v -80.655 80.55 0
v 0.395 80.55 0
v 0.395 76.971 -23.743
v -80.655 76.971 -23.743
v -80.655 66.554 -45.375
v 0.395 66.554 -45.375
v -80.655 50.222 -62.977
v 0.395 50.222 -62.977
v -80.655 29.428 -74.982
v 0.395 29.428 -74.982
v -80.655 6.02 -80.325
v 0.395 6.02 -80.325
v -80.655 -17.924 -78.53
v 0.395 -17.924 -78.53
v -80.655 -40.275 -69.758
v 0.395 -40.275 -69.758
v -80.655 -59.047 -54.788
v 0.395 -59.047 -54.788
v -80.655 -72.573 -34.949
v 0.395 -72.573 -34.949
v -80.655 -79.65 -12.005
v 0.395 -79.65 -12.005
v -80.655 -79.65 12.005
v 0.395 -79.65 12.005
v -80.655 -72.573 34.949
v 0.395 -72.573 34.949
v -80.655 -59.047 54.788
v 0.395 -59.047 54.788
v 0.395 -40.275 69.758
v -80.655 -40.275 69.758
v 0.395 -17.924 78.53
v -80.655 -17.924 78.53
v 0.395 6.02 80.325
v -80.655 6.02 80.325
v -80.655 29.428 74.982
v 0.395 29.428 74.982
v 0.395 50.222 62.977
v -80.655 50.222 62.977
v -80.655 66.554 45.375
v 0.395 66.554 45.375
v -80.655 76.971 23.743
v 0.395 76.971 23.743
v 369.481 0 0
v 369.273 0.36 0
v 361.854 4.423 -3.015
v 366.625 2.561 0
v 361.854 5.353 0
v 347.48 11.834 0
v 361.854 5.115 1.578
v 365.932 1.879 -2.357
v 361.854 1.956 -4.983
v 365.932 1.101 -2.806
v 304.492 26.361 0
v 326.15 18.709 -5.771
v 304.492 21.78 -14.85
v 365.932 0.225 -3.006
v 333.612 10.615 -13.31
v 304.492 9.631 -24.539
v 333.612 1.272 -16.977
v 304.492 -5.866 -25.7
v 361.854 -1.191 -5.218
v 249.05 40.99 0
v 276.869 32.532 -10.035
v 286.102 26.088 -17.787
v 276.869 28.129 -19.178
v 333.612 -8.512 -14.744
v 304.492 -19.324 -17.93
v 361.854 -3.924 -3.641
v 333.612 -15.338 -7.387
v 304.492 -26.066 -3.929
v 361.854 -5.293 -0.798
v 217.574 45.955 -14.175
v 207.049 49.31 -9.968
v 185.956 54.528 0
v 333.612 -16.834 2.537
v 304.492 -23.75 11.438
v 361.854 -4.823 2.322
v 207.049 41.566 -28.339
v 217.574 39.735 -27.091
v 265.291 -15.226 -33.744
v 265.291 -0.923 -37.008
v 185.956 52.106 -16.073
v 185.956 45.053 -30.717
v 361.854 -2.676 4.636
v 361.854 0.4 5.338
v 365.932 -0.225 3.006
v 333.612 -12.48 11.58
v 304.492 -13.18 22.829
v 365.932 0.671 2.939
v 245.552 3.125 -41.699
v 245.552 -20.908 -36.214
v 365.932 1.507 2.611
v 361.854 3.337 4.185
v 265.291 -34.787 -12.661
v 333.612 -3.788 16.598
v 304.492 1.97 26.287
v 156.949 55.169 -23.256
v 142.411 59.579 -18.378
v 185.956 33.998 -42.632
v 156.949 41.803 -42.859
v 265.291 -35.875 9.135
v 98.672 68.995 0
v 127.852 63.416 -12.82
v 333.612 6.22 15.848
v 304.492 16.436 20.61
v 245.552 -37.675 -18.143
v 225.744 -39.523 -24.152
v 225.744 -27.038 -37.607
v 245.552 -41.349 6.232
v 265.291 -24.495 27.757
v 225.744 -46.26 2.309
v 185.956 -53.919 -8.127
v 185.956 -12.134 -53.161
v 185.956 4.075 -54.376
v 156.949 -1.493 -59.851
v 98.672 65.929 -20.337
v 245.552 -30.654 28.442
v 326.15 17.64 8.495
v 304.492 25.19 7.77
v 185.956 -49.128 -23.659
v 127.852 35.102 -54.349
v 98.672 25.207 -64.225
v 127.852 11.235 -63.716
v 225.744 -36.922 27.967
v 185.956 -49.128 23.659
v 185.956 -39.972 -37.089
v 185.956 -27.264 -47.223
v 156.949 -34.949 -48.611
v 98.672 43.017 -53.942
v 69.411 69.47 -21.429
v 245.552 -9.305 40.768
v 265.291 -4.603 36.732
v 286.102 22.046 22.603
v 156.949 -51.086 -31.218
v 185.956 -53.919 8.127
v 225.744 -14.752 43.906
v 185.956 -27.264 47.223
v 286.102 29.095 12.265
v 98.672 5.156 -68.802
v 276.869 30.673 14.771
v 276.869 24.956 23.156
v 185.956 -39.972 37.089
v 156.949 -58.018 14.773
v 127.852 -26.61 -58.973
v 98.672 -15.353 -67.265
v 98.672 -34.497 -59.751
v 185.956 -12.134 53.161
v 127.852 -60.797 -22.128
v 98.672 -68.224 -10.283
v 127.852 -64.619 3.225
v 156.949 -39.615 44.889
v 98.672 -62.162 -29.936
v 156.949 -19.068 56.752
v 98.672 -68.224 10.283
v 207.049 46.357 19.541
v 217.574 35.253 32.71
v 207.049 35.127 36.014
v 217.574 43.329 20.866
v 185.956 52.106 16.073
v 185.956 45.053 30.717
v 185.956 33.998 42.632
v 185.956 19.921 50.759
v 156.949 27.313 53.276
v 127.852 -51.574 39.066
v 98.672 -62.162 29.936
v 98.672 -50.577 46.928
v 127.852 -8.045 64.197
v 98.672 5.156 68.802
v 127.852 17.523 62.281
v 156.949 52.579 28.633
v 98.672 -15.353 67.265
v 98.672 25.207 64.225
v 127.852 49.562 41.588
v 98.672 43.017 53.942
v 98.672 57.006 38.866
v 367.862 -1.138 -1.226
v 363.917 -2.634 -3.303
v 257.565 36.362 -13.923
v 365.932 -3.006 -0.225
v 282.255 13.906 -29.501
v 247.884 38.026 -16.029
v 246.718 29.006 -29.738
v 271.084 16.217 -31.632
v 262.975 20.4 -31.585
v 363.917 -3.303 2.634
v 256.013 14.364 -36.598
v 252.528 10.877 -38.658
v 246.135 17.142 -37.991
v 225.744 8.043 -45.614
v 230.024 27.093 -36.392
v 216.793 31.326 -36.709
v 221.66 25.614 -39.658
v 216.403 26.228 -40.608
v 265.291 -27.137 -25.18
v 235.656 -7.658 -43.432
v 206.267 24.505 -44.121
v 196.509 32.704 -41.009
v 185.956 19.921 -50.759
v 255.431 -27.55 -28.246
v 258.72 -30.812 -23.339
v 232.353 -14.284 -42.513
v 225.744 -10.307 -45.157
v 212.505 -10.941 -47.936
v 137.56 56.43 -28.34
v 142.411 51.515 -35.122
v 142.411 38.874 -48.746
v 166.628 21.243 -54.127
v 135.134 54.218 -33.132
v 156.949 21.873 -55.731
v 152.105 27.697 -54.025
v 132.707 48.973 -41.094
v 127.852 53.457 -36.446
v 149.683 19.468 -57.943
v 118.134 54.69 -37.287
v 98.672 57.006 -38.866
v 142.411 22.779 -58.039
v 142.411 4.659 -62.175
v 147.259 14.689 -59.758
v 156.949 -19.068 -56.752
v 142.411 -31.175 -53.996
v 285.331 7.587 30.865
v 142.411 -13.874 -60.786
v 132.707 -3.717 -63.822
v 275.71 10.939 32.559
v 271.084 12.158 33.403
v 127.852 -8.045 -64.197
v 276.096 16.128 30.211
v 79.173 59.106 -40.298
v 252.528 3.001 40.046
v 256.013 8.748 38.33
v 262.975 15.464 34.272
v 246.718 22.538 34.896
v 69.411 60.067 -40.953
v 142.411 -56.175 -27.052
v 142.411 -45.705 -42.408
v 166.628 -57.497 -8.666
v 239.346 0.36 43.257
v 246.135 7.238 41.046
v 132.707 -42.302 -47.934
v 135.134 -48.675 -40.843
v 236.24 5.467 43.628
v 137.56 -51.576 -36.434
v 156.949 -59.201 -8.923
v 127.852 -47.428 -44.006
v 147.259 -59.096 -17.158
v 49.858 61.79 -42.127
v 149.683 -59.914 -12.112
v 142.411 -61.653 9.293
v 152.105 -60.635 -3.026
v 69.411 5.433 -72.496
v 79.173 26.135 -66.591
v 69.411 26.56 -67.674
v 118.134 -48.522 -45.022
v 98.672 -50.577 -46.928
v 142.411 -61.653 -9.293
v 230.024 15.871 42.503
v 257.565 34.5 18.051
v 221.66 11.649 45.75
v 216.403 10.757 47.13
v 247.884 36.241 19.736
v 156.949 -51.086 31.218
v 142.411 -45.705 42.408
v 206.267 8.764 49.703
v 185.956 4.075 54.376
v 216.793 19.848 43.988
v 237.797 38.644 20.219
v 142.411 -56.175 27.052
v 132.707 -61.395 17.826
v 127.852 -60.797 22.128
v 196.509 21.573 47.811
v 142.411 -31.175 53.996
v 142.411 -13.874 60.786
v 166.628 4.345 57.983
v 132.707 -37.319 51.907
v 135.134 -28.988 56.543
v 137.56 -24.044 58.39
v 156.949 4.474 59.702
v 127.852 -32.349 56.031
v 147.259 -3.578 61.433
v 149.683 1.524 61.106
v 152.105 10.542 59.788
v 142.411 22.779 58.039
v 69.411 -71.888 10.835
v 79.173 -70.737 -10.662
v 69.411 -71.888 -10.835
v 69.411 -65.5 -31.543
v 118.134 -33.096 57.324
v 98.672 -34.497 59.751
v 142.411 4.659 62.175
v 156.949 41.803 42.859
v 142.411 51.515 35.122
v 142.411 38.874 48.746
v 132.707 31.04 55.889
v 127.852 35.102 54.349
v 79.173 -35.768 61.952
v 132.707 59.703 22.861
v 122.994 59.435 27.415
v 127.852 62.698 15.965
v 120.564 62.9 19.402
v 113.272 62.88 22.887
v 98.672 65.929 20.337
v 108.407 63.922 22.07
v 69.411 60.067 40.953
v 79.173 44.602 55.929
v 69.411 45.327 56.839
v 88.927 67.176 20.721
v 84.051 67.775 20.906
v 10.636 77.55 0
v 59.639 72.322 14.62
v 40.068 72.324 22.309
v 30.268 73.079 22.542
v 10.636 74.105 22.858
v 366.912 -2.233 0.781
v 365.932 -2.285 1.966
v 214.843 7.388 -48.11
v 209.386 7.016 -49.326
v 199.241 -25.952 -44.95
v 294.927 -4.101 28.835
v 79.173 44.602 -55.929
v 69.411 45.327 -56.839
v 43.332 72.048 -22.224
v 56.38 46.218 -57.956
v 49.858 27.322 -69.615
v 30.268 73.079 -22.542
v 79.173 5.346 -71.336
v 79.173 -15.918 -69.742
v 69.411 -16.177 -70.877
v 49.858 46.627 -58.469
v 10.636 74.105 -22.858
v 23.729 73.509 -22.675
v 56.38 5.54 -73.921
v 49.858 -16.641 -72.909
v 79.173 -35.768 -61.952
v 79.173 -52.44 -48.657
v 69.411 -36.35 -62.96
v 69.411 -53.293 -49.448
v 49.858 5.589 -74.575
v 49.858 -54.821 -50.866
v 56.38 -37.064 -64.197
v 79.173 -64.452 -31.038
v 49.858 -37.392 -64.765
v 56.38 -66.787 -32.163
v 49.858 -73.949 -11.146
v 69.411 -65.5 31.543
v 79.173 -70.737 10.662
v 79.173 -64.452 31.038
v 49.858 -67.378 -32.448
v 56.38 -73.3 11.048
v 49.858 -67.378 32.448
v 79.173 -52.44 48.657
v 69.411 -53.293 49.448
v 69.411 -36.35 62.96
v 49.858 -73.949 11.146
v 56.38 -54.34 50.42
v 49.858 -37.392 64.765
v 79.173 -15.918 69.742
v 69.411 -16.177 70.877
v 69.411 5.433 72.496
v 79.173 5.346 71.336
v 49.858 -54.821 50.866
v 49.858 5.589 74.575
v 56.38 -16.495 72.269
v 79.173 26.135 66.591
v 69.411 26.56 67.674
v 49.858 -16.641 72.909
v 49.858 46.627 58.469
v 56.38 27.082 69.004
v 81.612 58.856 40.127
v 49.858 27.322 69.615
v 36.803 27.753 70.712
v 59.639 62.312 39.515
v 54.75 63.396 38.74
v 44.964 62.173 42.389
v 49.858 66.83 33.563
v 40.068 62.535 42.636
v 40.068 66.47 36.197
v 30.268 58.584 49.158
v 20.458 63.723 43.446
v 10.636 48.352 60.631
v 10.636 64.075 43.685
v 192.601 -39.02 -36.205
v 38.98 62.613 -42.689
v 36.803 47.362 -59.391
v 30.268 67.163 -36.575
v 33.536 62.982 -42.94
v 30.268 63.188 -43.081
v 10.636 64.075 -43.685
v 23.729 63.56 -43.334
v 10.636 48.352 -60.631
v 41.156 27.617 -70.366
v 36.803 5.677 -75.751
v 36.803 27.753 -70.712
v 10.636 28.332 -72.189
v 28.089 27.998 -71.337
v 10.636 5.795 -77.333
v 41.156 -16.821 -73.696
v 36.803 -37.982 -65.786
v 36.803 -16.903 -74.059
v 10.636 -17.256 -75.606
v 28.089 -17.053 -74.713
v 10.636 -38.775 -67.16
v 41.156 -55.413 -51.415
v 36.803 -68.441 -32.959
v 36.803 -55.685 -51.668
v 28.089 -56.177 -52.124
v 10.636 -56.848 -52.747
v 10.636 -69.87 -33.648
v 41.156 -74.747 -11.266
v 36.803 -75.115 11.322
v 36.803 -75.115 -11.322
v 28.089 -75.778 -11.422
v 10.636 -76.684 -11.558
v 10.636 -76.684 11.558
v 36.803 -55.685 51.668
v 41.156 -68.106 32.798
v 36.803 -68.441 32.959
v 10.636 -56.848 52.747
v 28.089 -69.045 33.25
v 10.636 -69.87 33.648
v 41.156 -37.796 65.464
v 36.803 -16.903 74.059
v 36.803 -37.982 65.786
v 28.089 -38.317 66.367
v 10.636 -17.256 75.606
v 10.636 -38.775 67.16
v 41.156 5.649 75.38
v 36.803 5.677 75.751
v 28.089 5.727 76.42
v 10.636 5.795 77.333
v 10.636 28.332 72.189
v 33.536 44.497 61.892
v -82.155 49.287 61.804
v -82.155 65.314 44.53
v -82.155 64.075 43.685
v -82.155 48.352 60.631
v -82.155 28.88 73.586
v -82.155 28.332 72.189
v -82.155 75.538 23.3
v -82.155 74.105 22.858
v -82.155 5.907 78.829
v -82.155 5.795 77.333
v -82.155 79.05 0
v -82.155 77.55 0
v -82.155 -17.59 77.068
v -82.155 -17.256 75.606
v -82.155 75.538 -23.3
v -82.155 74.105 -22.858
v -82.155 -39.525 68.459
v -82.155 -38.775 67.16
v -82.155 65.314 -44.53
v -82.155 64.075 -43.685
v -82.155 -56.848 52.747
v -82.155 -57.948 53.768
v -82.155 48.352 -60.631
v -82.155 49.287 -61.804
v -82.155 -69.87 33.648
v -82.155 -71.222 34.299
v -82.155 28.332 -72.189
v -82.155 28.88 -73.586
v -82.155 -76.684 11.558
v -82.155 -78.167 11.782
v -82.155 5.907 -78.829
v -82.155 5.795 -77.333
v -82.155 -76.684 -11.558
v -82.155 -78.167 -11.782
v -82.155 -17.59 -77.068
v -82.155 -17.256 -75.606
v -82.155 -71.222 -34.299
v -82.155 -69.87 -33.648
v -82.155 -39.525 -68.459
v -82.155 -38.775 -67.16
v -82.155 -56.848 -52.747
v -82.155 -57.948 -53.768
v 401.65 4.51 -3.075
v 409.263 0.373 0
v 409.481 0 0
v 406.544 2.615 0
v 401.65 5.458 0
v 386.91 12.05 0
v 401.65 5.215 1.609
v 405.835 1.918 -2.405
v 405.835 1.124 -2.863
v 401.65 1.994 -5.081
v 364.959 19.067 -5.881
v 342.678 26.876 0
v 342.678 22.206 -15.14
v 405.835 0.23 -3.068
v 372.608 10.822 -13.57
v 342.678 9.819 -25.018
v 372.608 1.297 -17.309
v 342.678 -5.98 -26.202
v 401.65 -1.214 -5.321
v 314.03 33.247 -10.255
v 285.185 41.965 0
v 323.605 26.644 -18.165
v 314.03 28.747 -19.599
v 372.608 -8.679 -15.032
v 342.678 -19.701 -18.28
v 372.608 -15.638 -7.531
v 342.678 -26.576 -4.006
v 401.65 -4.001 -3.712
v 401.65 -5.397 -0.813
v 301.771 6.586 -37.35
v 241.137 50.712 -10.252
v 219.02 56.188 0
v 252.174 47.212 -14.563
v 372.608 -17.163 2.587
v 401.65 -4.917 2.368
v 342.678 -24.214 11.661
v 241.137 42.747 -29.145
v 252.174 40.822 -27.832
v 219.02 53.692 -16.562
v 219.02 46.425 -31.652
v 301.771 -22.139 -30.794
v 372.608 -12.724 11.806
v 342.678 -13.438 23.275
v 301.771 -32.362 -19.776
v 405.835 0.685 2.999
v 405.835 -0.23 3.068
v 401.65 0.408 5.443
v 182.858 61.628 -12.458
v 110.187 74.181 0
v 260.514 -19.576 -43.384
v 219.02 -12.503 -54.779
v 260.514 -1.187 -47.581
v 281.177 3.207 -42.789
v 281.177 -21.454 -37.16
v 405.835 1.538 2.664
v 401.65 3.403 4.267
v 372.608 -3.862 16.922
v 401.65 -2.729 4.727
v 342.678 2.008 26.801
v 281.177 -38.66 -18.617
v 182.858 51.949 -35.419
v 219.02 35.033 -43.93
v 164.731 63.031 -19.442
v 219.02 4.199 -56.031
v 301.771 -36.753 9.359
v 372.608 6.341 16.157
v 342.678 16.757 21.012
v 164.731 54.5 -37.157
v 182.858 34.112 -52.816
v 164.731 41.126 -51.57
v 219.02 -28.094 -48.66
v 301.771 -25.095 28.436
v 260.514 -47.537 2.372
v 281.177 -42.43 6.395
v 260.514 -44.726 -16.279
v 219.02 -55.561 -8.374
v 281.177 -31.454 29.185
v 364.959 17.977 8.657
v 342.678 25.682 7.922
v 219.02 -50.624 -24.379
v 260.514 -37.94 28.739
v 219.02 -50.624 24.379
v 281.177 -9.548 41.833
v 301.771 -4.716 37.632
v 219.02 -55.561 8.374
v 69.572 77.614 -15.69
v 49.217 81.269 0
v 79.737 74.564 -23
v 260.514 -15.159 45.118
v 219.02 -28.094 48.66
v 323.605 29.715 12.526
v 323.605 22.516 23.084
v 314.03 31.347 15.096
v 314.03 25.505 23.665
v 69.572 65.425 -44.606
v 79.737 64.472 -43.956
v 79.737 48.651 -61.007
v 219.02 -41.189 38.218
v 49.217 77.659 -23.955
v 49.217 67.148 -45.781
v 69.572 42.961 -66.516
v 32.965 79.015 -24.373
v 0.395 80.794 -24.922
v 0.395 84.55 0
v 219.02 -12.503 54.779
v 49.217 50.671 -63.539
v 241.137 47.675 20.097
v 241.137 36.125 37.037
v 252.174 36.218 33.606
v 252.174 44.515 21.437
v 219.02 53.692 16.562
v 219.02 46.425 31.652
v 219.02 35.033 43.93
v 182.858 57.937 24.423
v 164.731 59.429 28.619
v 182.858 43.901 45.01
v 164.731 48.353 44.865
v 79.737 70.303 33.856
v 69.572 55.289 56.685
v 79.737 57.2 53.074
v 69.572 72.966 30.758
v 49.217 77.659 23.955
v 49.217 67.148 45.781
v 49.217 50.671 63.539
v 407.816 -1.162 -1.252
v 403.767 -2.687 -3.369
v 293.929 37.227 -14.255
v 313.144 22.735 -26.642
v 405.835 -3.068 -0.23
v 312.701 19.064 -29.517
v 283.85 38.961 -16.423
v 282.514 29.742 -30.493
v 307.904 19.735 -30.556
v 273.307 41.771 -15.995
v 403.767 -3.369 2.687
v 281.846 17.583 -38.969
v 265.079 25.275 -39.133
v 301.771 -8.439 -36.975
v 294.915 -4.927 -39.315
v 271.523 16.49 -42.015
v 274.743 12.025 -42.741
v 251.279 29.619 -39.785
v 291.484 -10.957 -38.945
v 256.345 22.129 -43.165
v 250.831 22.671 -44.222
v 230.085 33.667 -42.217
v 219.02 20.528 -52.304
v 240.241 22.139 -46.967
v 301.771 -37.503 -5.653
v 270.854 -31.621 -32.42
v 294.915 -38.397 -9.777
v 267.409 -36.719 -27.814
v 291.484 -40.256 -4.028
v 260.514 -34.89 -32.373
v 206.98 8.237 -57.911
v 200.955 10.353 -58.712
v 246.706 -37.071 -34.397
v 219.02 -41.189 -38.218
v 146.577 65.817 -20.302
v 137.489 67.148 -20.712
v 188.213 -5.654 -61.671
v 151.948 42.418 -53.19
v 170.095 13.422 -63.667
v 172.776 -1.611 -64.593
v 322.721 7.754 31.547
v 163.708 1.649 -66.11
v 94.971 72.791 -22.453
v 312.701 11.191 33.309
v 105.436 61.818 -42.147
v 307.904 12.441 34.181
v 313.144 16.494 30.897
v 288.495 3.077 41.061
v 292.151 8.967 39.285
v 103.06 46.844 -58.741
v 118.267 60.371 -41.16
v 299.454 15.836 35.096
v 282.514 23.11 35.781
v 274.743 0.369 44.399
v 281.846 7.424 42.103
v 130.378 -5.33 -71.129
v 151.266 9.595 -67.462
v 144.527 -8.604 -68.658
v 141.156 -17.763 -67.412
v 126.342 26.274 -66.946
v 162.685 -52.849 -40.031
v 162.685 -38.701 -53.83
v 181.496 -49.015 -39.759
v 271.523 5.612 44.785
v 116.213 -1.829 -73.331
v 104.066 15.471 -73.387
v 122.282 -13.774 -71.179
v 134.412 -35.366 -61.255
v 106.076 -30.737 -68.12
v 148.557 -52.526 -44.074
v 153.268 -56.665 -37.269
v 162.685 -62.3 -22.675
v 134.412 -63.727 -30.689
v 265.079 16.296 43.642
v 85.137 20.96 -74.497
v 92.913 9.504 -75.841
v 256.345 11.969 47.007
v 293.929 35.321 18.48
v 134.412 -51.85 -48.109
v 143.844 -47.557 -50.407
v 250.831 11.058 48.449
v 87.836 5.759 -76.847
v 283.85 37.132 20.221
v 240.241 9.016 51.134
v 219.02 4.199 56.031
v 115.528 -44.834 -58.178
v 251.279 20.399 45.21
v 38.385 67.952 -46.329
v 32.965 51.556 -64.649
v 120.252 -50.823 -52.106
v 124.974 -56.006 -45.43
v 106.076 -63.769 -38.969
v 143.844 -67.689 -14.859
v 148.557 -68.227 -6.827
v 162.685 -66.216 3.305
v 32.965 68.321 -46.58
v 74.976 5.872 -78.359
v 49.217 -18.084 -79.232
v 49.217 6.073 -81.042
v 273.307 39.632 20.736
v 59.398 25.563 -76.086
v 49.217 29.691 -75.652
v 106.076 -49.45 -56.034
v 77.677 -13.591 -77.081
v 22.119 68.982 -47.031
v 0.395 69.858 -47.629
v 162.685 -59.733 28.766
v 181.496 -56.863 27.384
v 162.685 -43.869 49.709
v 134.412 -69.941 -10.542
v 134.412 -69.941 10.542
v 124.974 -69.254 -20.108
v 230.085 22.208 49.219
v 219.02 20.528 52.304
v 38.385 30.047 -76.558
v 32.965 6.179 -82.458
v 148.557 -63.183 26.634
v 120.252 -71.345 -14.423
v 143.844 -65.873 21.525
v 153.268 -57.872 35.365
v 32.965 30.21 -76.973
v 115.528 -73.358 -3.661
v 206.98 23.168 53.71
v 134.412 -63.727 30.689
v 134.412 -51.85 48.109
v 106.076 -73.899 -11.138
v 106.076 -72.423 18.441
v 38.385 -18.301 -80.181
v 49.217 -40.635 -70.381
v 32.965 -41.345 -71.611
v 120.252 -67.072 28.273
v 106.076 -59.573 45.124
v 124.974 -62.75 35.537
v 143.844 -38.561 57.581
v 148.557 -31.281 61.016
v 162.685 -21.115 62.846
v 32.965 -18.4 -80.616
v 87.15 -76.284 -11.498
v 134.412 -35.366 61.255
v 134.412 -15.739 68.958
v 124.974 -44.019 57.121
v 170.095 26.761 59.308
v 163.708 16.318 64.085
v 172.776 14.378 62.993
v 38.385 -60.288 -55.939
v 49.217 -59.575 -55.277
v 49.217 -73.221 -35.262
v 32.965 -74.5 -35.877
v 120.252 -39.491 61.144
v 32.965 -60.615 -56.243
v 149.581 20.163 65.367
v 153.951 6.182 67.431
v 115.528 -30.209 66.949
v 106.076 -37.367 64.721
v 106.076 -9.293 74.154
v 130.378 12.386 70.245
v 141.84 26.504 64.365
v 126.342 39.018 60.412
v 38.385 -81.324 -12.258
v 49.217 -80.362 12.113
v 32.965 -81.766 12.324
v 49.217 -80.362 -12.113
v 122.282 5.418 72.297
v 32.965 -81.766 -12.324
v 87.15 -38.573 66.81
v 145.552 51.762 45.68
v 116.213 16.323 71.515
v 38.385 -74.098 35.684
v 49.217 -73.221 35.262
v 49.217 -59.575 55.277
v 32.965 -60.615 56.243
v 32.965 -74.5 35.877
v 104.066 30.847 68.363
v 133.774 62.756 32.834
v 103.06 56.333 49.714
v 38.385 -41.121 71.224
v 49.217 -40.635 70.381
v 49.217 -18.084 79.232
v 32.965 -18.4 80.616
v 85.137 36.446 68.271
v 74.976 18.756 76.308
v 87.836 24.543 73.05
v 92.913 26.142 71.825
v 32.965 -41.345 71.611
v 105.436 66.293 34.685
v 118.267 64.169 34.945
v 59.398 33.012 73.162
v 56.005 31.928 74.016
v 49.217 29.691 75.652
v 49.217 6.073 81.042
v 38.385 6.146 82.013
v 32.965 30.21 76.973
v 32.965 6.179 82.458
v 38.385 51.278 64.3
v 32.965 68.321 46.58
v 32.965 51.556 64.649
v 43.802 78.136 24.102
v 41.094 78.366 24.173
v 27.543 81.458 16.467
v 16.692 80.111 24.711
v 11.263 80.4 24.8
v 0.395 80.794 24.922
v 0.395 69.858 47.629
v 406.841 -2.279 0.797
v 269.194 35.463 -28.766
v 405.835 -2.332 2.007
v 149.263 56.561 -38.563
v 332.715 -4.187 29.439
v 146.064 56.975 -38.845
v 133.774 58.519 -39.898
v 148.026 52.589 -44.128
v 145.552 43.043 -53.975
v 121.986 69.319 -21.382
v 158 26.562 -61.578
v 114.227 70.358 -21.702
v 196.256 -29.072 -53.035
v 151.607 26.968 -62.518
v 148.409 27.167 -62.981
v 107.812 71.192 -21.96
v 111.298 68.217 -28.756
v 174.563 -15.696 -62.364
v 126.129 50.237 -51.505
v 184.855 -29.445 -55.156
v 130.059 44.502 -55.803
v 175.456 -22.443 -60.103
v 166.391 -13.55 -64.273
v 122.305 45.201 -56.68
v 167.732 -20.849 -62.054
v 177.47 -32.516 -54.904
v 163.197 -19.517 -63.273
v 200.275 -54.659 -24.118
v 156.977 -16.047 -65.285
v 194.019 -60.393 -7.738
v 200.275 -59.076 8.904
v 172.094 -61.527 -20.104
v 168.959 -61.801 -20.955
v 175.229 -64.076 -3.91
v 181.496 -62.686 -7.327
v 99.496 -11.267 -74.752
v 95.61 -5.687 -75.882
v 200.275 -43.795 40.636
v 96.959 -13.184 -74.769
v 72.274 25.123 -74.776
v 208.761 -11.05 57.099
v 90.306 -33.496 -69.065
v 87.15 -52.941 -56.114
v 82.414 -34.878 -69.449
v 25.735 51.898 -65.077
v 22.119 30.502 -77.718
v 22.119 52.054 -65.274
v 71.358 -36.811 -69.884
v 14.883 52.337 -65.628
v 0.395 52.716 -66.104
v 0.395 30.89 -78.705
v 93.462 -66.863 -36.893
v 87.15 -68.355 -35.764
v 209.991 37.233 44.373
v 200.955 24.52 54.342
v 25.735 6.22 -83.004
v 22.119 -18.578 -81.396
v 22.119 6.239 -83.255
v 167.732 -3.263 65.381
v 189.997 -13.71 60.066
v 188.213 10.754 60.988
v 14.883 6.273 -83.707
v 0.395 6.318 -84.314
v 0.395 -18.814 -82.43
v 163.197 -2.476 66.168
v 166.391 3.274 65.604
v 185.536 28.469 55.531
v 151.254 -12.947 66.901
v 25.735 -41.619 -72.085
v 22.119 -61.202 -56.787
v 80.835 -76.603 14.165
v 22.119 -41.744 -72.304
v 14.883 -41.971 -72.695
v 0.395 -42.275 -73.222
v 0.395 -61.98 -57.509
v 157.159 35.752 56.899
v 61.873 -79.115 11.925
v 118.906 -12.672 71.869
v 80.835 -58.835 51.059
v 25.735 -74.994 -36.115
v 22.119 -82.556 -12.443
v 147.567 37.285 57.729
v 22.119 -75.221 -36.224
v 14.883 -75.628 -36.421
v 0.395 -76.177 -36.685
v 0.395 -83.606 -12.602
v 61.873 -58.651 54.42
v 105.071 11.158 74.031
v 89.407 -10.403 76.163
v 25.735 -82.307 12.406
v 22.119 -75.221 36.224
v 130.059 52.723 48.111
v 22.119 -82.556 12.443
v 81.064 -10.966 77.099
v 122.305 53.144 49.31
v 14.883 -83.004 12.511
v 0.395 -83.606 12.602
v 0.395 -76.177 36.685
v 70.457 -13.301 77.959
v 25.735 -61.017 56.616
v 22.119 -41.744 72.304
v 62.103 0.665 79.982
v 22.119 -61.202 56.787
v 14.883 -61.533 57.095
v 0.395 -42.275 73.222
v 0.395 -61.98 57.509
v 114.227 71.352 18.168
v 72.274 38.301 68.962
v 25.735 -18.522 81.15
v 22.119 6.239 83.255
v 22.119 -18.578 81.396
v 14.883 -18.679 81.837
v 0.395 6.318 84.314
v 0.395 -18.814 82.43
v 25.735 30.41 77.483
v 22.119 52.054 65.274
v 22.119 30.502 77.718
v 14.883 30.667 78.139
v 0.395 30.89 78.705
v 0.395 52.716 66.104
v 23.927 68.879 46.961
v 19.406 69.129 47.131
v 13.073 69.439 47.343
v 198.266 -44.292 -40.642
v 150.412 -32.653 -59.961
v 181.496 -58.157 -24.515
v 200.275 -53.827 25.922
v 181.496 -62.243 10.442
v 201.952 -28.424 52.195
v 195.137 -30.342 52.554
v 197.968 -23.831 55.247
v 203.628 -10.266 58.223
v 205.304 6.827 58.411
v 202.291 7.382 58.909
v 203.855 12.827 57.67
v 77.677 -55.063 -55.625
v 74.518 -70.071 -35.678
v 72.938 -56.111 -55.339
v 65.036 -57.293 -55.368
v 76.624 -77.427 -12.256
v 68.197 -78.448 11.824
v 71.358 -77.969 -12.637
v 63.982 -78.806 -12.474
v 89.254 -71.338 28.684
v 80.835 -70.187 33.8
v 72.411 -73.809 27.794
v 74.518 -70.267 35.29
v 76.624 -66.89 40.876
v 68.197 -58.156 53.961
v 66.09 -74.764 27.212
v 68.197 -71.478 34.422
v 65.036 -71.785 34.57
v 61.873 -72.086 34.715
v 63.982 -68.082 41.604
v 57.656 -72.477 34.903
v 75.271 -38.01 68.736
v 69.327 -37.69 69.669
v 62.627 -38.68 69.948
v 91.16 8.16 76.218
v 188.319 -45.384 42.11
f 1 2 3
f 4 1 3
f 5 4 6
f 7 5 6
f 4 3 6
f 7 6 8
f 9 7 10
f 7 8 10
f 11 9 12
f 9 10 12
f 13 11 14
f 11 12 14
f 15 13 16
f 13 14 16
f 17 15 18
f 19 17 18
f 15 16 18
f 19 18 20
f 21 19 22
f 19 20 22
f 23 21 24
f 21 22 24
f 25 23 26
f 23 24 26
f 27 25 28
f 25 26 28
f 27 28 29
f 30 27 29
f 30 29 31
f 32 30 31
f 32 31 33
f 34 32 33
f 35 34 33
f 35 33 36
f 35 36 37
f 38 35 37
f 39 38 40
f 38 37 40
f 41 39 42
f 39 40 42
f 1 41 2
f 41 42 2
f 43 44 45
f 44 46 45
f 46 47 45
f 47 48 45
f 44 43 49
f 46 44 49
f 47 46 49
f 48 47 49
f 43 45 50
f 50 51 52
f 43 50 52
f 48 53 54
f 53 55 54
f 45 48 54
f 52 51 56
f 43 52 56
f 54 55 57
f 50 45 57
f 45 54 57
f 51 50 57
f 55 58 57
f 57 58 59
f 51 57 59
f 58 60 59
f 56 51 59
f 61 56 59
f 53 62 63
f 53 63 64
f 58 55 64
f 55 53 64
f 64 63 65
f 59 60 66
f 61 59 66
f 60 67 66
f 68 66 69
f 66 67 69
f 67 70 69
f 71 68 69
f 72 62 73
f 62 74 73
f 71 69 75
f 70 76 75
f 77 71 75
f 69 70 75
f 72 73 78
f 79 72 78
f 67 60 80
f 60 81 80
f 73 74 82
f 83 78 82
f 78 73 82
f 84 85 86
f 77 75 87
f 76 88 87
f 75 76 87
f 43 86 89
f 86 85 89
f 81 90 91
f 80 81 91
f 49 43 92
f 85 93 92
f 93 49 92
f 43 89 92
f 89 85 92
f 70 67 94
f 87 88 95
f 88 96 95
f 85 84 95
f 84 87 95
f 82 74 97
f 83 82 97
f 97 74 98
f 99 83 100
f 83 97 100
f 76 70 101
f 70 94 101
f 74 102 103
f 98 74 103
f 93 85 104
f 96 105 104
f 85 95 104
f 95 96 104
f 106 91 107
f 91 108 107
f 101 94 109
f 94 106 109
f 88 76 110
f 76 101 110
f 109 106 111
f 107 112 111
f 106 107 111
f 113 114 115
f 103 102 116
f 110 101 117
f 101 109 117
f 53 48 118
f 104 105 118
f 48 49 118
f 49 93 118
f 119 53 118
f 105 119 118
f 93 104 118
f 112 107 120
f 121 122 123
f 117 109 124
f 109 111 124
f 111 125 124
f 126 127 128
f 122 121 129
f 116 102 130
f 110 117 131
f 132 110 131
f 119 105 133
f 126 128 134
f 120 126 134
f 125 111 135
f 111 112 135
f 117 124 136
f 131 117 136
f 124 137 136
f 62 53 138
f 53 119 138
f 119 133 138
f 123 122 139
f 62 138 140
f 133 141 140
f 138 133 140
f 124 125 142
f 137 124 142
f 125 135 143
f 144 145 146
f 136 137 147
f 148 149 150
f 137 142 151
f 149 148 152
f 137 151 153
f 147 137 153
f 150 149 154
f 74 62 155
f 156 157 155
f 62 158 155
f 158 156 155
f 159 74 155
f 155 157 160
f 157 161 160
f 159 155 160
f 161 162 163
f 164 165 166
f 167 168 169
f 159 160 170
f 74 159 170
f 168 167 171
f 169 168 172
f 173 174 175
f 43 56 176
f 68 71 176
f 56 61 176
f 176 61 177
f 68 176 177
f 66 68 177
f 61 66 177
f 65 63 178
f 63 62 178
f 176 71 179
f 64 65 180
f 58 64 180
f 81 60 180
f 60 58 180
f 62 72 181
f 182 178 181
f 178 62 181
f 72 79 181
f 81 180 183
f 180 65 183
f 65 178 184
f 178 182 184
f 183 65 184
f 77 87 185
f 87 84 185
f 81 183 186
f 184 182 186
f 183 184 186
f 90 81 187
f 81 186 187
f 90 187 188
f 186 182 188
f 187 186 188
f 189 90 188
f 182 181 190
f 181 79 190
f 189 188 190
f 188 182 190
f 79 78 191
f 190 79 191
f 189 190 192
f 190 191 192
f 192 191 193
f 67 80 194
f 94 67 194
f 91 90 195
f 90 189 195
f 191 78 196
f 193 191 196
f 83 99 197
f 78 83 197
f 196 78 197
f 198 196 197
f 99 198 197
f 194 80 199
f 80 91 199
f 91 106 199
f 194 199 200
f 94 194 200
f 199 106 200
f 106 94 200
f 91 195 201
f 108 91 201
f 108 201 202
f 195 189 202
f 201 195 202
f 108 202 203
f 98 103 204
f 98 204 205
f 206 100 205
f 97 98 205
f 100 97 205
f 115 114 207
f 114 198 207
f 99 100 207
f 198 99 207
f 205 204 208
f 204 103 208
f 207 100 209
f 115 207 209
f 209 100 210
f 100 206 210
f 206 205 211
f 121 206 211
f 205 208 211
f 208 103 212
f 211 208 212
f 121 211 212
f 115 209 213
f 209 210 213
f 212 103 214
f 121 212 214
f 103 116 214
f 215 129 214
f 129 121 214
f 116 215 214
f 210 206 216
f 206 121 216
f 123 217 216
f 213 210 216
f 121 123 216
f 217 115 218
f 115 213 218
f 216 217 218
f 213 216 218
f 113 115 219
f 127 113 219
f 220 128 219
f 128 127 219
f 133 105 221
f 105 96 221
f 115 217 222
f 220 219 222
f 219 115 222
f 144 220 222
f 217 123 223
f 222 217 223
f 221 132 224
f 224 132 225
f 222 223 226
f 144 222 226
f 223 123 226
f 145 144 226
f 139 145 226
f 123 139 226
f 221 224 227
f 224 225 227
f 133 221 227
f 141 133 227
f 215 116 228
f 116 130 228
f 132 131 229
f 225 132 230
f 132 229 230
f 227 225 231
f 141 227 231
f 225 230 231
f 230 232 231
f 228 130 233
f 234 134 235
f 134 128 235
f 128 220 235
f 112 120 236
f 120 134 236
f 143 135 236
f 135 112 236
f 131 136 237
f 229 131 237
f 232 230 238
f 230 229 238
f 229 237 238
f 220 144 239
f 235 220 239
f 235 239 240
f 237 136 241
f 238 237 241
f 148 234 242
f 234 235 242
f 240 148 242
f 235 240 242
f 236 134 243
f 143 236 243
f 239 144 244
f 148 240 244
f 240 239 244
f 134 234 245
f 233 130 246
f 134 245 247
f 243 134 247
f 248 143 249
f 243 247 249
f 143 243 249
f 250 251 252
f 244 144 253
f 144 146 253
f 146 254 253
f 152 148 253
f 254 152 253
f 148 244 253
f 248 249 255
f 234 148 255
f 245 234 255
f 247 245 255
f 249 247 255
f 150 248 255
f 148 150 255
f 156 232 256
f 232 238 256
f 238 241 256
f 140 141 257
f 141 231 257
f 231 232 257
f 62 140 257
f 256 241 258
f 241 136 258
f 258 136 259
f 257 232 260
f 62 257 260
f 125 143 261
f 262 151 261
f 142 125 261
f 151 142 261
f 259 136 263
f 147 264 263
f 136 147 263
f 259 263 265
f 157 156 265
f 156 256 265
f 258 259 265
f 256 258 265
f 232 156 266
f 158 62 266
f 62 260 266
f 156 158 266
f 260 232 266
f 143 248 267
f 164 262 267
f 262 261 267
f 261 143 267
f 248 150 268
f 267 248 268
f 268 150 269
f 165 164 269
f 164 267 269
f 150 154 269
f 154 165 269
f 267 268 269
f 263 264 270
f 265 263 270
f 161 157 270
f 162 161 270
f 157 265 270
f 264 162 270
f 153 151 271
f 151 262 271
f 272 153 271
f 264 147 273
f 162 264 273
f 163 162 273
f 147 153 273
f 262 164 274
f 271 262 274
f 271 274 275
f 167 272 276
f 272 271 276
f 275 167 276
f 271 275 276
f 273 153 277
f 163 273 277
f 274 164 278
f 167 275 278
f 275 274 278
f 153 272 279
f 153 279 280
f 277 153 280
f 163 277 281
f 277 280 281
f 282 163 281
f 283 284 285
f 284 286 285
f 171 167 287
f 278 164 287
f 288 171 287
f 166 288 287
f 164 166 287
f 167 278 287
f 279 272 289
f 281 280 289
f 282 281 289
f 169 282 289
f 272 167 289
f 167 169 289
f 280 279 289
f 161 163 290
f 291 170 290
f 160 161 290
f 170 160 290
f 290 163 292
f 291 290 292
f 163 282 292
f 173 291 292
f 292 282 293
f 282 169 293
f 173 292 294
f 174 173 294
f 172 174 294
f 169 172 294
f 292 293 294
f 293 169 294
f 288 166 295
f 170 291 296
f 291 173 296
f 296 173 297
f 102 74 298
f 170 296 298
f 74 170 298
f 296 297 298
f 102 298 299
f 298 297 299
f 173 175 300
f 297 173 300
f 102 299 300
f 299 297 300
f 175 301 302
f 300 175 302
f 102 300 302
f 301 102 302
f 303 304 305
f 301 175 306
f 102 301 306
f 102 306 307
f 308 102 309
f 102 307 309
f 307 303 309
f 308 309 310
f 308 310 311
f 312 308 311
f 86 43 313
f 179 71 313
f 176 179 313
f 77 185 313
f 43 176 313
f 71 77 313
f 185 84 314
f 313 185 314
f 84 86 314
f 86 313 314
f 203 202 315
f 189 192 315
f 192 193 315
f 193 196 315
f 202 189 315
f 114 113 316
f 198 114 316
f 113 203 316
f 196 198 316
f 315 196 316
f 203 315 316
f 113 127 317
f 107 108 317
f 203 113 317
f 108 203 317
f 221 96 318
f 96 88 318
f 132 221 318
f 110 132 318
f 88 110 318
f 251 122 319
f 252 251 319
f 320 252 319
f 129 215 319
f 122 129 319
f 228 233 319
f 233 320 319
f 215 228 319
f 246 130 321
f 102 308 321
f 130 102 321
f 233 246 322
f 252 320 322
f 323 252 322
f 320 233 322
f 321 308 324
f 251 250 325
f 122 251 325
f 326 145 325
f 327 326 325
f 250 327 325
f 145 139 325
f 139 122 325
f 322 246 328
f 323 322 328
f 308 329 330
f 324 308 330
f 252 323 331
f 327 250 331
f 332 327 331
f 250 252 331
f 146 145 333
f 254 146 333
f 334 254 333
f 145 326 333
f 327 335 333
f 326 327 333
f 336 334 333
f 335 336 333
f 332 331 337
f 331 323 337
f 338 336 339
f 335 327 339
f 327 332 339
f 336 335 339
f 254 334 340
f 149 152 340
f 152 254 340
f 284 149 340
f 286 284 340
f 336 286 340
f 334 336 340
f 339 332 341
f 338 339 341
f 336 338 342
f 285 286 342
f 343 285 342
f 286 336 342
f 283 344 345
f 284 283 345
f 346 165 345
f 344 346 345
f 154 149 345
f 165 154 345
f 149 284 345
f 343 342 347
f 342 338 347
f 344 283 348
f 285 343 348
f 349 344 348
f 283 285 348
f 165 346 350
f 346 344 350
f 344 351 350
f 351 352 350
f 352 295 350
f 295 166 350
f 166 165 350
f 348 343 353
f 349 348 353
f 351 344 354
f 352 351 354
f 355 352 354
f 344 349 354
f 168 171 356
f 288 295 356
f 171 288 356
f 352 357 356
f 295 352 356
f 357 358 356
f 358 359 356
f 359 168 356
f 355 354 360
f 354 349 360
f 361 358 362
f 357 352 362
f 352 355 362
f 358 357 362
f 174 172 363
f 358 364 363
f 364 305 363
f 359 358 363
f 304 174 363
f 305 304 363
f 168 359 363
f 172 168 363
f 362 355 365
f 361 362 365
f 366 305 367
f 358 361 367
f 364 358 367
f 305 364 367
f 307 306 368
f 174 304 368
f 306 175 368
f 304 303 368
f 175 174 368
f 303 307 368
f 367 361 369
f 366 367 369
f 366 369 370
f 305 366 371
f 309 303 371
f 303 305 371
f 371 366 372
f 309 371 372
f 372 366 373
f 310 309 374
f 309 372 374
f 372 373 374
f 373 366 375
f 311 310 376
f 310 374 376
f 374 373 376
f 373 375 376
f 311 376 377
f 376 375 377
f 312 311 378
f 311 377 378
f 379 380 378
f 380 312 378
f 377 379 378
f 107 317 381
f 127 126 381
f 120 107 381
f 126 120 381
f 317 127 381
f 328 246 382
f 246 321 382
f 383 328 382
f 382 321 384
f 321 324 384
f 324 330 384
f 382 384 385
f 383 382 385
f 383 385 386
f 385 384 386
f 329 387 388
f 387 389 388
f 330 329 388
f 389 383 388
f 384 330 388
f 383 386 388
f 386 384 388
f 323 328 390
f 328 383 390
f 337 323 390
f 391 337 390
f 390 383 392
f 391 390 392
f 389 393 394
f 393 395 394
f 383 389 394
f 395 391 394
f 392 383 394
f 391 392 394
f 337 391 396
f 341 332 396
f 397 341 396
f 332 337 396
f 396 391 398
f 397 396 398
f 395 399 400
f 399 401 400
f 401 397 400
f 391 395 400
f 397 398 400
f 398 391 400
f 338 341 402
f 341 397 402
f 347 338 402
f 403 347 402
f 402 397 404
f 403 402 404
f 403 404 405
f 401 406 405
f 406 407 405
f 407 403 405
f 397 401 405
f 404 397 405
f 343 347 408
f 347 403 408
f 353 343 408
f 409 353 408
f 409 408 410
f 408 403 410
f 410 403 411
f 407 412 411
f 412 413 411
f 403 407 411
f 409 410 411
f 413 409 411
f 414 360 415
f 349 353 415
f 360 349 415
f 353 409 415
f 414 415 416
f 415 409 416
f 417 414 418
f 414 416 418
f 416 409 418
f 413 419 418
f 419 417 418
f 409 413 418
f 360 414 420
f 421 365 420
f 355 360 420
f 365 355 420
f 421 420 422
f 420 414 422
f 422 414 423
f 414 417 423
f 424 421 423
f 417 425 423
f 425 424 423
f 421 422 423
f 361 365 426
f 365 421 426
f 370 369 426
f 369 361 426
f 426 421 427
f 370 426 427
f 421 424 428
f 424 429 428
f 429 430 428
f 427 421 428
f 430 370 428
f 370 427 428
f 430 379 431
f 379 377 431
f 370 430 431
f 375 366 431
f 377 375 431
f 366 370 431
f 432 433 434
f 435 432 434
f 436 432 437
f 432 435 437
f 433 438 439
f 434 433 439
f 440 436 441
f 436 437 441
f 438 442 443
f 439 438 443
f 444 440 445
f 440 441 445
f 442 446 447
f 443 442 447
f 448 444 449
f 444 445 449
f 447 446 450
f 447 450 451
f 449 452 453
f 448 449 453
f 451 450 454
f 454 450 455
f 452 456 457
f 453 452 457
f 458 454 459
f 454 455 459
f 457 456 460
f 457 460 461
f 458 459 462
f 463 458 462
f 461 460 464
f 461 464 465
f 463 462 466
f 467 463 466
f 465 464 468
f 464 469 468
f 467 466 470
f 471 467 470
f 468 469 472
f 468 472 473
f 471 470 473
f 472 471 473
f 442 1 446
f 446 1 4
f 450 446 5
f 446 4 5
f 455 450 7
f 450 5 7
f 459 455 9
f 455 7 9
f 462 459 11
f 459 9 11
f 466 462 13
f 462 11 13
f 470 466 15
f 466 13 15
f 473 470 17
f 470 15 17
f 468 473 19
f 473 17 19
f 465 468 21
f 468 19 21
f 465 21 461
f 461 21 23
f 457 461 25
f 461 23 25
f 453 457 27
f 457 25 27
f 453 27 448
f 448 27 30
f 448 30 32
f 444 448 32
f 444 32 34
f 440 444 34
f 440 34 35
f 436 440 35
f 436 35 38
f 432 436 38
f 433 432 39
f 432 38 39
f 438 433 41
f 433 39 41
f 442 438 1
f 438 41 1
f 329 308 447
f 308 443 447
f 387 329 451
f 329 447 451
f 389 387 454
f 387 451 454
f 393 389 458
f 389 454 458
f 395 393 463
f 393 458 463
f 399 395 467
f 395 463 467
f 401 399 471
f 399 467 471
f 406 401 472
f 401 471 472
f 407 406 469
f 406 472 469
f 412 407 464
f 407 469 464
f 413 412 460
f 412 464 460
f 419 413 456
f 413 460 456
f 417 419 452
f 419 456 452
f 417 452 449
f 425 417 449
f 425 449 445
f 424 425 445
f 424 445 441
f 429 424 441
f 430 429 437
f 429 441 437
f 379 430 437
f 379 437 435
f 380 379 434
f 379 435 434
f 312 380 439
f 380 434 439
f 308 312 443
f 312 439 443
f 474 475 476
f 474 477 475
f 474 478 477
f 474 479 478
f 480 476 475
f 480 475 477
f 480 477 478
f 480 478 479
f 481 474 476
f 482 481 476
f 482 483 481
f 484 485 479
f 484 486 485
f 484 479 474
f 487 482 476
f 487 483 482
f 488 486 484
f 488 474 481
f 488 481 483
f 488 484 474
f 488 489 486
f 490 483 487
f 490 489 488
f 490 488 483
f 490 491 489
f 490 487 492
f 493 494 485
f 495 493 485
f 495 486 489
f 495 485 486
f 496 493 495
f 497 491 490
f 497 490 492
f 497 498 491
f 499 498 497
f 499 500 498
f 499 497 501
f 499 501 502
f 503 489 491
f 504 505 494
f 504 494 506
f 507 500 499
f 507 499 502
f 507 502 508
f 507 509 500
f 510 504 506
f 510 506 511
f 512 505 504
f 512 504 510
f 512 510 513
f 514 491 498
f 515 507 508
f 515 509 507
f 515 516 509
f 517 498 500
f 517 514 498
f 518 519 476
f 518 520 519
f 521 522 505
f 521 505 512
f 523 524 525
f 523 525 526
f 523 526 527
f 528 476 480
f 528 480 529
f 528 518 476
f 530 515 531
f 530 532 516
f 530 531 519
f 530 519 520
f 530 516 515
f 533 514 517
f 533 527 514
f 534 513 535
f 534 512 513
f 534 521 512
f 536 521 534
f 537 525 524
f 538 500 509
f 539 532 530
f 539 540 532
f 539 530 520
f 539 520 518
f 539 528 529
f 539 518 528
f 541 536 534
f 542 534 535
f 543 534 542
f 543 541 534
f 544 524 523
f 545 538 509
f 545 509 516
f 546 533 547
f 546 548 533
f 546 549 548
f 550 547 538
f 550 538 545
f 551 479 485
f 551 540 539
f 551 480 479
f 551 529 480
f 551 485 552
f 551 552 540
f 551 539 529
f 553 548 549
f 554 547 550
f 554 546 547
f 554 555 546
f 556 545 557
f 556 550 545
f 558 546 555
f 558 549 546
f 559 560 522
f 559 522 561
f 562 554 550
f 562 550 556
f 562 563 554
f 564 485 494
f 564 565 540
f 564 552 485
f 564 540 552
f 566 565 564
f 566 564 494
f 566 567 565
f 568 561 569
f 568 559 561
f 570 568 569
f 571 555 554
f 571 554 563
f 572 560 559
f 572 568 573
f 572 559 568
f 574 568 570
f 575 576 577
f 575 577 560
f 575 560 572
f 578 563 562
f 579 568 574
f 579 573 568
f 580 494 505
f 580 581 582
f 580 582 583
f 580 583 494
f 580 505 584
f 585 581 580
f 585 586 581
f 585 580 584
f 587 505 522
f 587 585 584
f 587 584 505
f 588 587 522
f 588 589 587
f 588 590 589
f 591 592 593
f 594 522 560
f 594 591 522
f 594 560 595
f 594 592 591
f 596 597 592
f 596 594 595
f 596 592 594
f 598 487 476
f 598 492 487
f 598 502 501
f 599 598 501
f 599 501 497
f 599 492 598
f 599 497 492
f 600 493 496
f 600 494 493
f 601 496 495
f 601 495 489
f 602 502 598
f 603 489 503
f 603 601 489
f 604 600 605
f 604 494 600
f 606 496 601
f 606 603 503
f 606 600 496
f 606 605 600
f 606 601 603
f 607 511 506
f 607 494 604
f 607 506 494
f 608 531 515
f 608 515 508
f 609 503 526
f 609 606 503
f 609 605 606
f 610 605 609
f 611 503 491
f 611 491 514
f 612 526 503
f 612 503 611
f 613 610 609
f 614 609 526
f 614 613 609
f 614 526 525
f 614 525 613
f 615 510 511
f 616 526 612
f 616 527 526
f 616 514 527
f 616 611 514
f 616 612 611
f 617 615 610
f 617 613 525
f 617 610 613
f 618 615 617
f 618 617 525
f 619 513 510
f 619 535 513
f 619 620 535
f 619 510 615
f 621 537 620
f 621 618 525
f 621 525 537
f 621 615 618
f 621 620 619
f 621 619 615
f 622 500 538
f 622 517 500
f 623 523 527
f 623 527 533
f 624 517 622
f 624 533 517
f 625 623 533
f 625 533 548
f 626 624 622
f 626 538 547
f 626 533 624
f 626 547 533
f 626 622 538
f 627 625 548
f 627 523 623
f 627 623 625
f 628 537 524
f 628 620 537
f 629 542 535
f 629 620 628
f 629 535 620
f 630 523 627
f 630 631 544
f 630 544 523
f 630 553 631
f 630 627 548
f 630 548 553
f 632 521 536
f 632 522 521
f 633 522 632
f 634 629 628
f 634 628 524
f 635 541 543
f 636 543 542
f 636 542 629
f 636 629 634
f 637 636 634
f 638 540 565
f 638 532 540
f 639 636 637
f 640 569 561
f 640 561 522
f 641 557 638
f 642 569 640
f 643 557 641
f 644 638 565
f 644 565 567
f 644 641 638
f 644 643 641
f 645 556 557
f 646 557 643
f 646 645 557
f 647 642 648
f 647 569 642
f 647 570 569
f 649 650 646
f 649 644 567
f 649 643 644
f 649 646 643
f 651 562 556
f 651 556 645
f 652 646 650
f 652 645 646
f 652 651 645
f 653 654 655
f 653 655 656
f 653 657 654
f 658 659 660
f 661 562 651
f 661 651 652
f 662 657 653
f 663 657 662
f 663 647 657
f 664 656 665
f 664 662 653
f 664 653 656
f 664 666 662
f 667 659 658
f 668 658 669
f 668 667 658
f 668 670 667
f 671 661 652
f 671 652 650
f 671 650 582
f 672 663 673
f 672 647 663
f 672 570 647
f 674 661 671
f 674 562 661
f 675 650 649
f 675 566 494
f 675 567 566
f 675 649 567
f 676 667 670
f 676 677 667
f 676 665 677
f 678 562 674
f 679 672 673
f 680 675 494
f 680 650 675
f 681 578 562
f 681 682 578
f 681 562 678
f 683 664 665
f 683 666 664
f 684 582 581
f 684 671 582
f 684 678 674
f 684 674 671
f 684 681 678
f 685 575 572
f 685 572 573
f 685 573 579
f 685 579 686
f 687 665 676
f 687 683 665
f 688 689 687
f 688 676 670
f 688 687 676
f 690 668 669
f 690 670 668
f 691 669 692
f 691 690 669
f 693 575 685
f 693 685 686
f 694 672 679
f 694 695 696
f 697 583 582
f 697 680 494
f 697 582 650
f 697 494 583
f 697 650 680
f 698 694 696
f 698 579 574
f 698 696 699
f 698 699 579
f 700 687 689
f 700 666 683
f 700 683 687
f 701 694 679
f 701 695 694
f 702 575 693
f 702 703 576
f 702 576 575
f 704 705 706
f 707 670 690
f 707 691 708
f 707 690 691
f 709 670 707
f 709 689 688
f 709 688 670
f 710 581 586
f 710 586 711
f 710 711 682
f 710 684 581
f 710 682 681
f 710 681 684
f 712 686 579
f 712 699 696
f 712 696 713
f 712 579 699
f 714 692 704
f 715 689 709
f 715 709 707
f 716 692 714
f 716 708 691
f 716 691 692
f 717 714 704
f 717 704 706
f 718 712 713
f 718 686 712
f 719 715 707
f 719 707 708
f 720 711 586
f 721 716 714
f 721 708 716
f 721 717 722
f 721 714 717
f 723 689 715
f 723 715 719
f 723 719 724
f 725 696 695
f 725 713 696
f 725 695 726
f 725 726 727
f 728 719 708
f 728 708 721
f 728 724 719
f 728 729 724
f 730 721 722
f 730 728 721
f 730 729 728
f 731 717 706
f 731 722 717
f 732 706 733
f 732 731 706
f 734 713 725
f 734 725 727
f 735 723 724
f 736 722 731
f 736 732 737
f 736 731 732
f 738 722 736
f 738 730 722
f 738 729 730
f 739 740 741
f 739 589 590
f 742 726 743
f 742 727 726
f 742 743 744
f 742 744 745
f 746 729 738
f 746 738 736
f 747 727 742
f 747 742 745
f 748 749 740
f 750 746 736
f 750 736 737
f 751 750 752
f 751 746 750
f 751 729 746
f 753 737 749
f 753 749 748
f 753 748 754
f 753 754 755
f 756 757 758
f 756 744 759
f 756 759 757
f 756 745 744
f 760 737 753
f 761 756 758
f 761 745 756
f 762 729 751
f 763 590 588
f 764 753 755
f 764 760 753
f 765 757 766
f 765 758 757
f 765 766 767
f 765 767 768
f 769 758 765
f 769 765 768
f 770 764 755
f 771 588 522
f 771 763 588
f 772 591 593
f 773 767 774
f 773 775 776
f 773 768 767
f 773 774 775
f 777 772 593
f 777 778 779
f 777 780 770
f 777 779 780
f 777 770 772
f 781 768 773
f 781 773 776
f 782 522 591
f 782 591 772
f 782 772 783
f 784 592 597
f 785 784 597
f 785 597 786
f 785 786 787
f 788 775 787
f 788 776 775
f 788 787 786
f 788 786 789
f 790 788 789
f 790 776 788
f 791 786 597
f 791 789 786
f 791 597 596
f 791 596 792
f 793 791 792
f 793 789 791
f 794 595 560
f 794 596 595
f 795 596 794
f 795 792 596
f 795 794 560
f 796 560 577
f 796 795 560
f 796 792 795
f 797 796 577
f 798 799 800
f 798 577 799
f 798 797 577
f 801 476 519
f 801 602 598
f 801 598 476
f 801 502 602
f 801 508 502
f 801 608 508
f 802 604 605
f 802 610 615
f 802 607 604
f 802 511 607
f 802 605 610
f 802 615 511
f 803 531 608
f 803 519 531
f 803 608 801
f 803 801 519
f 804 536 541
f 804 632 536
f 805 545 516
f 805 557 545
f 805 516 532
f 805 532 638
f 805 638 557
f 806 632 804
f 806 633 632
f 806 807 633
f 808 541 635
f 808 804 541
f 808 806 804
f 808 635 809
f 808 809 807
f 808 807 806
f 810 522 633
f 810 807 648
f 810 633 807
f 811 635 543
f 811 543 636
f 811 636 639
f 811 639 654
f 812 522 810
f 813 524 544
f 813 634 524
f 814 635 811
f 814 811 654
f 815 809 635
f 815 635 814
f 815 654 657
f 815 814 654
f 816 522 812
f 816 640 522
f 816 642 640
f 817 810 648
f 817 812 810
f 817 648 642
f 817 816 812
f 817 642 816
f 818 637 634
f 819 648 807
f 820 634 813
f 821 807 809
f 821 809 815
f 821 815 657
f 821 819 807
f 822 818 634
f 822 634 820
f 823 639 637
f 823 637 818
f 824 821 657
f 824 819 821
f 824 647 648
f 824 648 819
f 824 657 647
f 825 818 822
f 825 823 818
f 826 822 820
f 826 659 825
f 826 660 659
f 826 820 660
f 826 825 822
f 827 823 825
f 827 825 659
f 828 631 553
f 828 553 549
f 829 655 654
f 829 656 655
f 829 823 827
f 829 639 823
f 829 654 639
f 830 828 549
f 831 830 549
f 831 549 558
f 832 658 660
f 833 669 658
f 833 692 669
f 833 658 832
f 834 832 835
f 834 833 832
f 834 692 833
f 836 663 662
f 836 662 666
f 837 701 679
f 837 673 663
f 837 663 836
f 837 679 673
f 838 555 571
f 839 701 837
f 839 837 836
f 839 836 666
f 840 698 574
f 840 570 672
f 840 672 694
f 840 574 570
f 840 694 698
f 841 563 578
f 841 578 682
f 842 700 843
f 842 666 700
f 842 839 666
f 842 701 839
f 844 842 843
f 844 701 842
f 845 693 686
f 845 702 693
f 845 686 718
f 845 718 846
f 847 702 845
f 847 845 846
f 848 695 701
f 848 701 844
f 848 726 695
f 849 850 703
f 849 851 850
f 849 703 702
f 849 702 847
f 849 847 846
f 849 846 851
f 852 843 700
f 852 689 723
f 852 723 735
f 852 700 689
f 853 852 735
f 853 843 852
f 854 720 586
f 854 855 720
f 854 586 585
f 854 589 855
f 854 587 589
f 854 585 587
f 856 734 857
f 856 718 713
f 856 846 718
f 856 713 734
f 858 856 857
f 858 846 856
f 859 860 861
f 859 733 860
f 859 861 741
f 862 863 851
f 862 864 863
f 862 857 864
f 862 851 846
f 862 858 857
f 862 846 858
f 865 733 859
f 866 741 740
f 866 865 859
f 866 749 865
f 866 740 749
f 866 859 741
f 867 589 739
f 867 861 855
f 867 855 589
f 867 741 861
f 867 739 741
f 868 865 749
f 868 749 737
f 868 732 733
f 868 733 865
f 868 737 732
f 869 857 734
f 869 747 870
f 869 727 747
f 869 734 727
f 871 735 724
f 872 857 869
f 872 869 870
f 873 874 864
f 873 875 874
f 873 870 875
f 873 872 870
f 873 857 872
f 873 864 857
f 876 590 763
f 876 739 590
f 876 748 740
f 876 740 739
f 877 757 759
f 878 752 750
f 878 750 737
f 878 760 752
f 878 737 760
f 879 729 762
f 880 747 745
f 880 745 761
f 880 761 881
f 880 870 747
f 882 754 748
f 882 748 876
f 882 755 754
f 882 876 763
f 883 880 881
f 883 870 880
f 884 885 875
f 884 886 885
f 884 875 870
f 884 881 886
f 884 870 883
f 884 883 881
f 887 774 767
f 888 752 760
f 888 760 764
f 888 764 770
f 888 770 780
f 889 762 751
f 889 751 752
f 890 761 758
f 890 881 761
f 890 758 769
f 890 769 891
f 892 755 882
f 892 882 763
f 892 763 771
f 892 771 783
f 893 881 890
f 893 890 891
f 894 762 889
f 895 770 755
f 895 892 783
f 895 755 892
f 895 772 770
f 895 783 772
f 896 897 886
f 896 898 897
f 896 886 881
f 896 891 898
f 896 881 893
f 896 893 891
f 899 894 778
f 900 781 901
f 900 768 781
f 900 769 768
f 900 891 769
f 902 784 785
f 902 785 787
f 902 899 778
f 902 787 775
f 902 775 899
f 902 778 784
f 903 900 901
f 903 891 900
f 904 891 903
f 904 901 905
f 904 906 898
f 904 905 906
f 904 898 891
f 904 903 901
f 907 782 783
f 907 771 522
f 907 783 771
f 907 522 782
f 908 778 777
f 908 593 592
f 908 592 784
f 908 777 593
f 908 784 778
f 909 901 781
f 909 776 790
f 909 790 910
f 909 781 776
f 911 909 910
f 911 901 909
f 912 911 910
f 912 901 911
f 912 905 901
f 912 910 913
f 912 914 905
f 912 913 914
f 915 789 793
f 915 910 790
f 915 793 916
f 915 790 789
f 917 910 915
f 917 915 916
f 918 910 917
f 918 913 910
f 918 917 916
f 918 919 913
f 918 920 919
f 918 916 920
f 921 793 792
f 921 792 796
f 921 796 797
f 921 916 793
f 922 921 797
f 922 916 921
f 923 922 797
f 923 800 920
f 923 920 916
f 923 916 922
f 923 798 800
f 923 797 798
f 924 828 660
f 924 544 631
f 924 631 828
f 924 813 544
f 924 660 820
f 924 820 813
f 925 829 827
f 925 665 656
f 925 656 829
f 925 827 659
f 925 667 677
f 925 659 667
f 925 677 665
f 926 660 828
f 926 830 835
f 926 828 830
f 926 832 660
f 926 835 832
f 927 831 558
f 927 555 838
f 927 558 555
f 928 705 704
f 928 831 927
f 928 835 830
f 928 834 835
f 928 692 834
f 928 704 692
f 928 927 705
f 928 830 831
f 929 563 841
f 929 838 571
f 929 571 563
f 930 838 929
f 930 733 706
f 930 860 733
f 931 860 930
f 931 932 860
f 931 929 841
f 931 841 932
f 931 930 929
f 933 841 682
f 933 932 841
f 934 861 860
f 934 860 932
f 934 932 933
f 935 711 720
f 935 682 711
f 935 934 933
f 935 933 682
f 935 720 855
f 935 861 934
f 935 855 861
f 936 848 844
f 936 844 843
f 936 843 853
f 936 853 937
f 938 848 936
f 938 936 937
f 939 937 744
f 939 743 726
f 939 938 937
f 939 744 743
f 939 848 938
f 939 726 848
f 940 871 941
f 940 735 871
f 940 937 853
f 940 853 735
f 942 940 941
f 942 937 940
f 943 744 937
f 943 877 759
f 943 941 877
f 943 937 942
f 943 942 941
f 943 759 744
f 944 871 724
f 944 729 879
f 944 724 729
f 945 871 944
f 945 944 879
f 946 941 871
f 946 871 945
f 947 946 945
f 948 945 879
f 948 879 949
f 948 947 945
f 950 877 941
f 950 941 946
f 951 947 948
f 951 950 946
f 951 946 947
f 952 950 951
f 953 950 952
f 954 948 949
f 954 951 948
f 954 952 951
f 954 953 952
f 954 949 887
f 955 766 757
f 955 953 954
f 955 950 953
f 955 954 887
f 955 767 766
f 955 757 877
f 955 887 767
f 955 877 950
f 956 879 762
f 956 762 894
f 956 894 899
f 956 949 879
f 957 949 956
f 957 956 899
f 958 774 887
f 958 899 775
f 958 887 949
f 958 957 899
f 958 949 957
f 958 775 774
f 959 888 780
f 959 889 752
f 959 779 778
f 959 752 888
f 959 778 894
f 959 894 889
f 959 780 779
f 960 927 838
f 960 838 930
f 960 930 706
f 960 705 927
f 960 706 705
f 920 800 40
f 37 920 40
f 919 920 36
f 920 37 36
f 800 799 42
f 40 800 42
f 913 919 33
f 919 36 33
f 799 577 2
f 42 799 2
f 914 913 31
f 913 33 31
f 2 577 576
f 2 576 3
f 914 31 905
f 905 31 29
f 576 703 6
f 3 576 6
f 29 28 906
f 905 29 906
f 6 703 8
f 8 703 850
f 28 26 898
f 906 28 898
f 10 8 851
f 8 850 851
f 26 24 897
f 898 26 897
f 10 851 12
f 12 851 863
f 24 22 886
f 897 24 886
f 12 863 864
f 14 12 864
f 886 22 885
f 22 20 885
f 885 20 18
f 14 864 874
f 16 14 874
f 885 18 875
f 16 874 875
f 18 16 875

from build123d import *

# Parameters (mm, degrees)
CHAMFER1_SIZE = 1.5


with BuildPart() as part:
    # Sketch10 → Revolve1 (revolve)
    with BuildSketch(Plane.XY):
        with BuildLine():
            Line((10.635874649, 77.55), (-82.154687473, 77.55))
            Line((-82.154687473, 77.55), (-82.154687473, 80.55))
            Line((-82.154687473, 80.55), (0.395312527, 80.55))
            Line((0.395312527, 80.55), (0.395312527, 84.55))
            add(Edge.make_bspline(
                [(409.481241764, 0), (409.478822602, 0.013487485), (409.471791677, 0.039860166), (409.44996872, 0.090299923), (409.405170369, 0.17360441), (409.338622841, 0.274707126), (409.233198984, 0.41435486), (409.071473276, 0.602630626), (408.814393211, 0.868443814), (408.376034855, 1.268699656), (407.623681971, 1.874044786), (406.300886659, 2.80689474), (403.950805973, 4.254089379), (399.800317204, 6.473924098), (392.936954952, 9.659940464), (381.088920065, 14.458133958), (364.027881021, 20.439719136), (342.565783158, 27.076024485), (317.737377085, 33.948483164), (292.149117176, 40.40246553), (266.444005618, 46.372709865), (240.645313143, 51.922660722), (214.767260005, 57.089687778), (188.820024567, 61.896435261), (166.061529058, 65.795828503), (146.518269237, 68.91929539), (130.209185955, 71.372758968), (117.148436808, 73.24373966), (104.074432981, 75.019811614), (92.623234339, 76.487170689), (82.799789073, 77.679439415), (74.608164803, 78.626986039), (68.051597153, 79.356294804), (61.491752048, 80.05557077), (54.928607929, 80.723256072), (48.362151485, 81.357482811), (41.792344871, 81.955972251), (36.040789439, 82.445886318), (31.108722933, 82.839416847), (26.997195352, 83.148219974), (23.707077769, 83.383057729), (20.091694532, 83.626627241), (16.724439325, 83.837024008), (13.60553361, 84.016286235), (10.735186496, 84.166698043), (8.43841491, 84.277064727), (6.141138628, 84.376754941), (4.13054718, 84.451863988), (2.40683331, 84.506841756), (1.257457843, 84.534358411), (0.682722204, 84.546806796), (0.395312527, 84.55)],
                knots=[0, 0, 0, 0, 0, 0.000130123, 0.000260245, 0.000520491, 0.000900391, 0.00128029, 0.001925099, 0.002881508, 0.004418208, 0.006927086, 0.011110697, 0.018279138, 0.03067276, 0.051704469, 0.08310228, 0.139908797, 0.202702513, 0.265496165, 0.328289682, 0.391083359, 0.453876973, 0.516670577, 0.579464197, 0.642257765, 0.673654596, 0.705051427, 0.736448267, 0.767845106, 0.799241874, 0.814940257, 0.830638641, 0.846337073, 0.862035505, 0.877733936, 0.893432368, 0.90913072, 0.924829072, 0.932678248, 0.940527424, 0.9483766, 0.956225776, 0.967169332, 0.97264111, 0.978112888, 0.983584666, 0.989056444, 0.994528222, 0.997264111, 1, 1, 1, 1, 1], degree=4))
            Line((409.481241764, 0), (369.481241764, 0))
            add(Edge.make_bspline(
                [(369.481241764, 0), (369.479136427, 0.012313297), (369.472953977, 0.036418276), (369.45359797, 0.082627122), (369.414328459, 0.157917729), (369.356429793, 0.248740065), (369.265020656, 0.373899739), (369.123861296, 0.543957157), (368.897069053, 0.786384211), (368.508258256, 1.152912242), (367.837373575, 1.709573455), (366.657962177, 2.566700168), (364.558017618, 3.899200908), (360.865618953, 5.934211086), (354.805328477, 8.836759468), (344.391180354, 13.197167349), (329.431545128, 18.632620483), (310.628295275, 24.669689899), (288.864918388, 30.935059762), (266.427265346, 36.829336196), (243.880560946, 42.290562892), (221.246296693, 47.375026348), (198.537651833, 52.115899956), (175.763975962, 56.533212855), (155.78553292, 60.122875559), (138.627190745, 63.002853292), (124.306793182, 65.268344632), (112.837717735, 66.998082779), (101.356055229, 68.642323644), (91.298712805, 70.002886444), (82.670377365, 71.110042236), (75.47491226, 71.991156585), (69.715412986, 72.670115403), (63.95277294, 73.321953145), (58.186965818, 73.945246758), (52.417974559, 74.538293621), (46.645754847, 75.099004997), (41.592187646, 75.559059761), (37.258461535, 75.929453889), (33.645590132, 76.220759301), (30.754418422, 76.442688114), (27.600376545, 76.671760648), (24.183147106, 76.902673679), (20.995230634, 77.098317274), (18.036853679, 77.259743837), (15.57072725, 77.378462484), (13.843977698, 77.451161401), (12.363561894, 77.505178568), (11.376380067, 77.533293738), (10.882741728, 77.546187792), (10.635874649, 77.55)],
                knots=[0, 0, 0, 0, 0, 0.000134949, 0.000269899, 0.000539798, 0.000919537, 0.001299277, 0.001947431, 0.00293136, 0.004511869, 0.007081312, 0.011380263, 0.018707867, 0.031423867, 0.052705479, 0.084103008, 0.140910136, 0.203703492, 0.266497064, 0.329290816, 0.392084375, 0.454877964, 0.517671564, 0.580465191, 0.643258828, 0.674655593, 0.706052358, 0.737449114, 0.768845869, 0.800242661, 0.815941057, 0.831639453, 0.847337924, 0.863036395, 0.878734865, 0.894433336, 0.910131716, 0.925830096, 0.933679285, 0.941528475, 0.949377665, 0.957226855, 0.967920141, 0.978613427, 0.983960071, 0.989306714, 0.994653357, 0.997326678, 1, 1, 1, 1, 1], degree=4))
        make_face()
    revolve(axis=Axis((446.938975823, 0, 0), (-1, 0, 0)))

    # Chamfer1
    chamfer1_edges = [part.edges().sort_by_distance(p)[0] for p in [
        (-82.154687473, -80.55, 0),
    ]]
    chamfer(chamfer1_edges, length=CHAMFER1_SIZE)


solid = part.part
